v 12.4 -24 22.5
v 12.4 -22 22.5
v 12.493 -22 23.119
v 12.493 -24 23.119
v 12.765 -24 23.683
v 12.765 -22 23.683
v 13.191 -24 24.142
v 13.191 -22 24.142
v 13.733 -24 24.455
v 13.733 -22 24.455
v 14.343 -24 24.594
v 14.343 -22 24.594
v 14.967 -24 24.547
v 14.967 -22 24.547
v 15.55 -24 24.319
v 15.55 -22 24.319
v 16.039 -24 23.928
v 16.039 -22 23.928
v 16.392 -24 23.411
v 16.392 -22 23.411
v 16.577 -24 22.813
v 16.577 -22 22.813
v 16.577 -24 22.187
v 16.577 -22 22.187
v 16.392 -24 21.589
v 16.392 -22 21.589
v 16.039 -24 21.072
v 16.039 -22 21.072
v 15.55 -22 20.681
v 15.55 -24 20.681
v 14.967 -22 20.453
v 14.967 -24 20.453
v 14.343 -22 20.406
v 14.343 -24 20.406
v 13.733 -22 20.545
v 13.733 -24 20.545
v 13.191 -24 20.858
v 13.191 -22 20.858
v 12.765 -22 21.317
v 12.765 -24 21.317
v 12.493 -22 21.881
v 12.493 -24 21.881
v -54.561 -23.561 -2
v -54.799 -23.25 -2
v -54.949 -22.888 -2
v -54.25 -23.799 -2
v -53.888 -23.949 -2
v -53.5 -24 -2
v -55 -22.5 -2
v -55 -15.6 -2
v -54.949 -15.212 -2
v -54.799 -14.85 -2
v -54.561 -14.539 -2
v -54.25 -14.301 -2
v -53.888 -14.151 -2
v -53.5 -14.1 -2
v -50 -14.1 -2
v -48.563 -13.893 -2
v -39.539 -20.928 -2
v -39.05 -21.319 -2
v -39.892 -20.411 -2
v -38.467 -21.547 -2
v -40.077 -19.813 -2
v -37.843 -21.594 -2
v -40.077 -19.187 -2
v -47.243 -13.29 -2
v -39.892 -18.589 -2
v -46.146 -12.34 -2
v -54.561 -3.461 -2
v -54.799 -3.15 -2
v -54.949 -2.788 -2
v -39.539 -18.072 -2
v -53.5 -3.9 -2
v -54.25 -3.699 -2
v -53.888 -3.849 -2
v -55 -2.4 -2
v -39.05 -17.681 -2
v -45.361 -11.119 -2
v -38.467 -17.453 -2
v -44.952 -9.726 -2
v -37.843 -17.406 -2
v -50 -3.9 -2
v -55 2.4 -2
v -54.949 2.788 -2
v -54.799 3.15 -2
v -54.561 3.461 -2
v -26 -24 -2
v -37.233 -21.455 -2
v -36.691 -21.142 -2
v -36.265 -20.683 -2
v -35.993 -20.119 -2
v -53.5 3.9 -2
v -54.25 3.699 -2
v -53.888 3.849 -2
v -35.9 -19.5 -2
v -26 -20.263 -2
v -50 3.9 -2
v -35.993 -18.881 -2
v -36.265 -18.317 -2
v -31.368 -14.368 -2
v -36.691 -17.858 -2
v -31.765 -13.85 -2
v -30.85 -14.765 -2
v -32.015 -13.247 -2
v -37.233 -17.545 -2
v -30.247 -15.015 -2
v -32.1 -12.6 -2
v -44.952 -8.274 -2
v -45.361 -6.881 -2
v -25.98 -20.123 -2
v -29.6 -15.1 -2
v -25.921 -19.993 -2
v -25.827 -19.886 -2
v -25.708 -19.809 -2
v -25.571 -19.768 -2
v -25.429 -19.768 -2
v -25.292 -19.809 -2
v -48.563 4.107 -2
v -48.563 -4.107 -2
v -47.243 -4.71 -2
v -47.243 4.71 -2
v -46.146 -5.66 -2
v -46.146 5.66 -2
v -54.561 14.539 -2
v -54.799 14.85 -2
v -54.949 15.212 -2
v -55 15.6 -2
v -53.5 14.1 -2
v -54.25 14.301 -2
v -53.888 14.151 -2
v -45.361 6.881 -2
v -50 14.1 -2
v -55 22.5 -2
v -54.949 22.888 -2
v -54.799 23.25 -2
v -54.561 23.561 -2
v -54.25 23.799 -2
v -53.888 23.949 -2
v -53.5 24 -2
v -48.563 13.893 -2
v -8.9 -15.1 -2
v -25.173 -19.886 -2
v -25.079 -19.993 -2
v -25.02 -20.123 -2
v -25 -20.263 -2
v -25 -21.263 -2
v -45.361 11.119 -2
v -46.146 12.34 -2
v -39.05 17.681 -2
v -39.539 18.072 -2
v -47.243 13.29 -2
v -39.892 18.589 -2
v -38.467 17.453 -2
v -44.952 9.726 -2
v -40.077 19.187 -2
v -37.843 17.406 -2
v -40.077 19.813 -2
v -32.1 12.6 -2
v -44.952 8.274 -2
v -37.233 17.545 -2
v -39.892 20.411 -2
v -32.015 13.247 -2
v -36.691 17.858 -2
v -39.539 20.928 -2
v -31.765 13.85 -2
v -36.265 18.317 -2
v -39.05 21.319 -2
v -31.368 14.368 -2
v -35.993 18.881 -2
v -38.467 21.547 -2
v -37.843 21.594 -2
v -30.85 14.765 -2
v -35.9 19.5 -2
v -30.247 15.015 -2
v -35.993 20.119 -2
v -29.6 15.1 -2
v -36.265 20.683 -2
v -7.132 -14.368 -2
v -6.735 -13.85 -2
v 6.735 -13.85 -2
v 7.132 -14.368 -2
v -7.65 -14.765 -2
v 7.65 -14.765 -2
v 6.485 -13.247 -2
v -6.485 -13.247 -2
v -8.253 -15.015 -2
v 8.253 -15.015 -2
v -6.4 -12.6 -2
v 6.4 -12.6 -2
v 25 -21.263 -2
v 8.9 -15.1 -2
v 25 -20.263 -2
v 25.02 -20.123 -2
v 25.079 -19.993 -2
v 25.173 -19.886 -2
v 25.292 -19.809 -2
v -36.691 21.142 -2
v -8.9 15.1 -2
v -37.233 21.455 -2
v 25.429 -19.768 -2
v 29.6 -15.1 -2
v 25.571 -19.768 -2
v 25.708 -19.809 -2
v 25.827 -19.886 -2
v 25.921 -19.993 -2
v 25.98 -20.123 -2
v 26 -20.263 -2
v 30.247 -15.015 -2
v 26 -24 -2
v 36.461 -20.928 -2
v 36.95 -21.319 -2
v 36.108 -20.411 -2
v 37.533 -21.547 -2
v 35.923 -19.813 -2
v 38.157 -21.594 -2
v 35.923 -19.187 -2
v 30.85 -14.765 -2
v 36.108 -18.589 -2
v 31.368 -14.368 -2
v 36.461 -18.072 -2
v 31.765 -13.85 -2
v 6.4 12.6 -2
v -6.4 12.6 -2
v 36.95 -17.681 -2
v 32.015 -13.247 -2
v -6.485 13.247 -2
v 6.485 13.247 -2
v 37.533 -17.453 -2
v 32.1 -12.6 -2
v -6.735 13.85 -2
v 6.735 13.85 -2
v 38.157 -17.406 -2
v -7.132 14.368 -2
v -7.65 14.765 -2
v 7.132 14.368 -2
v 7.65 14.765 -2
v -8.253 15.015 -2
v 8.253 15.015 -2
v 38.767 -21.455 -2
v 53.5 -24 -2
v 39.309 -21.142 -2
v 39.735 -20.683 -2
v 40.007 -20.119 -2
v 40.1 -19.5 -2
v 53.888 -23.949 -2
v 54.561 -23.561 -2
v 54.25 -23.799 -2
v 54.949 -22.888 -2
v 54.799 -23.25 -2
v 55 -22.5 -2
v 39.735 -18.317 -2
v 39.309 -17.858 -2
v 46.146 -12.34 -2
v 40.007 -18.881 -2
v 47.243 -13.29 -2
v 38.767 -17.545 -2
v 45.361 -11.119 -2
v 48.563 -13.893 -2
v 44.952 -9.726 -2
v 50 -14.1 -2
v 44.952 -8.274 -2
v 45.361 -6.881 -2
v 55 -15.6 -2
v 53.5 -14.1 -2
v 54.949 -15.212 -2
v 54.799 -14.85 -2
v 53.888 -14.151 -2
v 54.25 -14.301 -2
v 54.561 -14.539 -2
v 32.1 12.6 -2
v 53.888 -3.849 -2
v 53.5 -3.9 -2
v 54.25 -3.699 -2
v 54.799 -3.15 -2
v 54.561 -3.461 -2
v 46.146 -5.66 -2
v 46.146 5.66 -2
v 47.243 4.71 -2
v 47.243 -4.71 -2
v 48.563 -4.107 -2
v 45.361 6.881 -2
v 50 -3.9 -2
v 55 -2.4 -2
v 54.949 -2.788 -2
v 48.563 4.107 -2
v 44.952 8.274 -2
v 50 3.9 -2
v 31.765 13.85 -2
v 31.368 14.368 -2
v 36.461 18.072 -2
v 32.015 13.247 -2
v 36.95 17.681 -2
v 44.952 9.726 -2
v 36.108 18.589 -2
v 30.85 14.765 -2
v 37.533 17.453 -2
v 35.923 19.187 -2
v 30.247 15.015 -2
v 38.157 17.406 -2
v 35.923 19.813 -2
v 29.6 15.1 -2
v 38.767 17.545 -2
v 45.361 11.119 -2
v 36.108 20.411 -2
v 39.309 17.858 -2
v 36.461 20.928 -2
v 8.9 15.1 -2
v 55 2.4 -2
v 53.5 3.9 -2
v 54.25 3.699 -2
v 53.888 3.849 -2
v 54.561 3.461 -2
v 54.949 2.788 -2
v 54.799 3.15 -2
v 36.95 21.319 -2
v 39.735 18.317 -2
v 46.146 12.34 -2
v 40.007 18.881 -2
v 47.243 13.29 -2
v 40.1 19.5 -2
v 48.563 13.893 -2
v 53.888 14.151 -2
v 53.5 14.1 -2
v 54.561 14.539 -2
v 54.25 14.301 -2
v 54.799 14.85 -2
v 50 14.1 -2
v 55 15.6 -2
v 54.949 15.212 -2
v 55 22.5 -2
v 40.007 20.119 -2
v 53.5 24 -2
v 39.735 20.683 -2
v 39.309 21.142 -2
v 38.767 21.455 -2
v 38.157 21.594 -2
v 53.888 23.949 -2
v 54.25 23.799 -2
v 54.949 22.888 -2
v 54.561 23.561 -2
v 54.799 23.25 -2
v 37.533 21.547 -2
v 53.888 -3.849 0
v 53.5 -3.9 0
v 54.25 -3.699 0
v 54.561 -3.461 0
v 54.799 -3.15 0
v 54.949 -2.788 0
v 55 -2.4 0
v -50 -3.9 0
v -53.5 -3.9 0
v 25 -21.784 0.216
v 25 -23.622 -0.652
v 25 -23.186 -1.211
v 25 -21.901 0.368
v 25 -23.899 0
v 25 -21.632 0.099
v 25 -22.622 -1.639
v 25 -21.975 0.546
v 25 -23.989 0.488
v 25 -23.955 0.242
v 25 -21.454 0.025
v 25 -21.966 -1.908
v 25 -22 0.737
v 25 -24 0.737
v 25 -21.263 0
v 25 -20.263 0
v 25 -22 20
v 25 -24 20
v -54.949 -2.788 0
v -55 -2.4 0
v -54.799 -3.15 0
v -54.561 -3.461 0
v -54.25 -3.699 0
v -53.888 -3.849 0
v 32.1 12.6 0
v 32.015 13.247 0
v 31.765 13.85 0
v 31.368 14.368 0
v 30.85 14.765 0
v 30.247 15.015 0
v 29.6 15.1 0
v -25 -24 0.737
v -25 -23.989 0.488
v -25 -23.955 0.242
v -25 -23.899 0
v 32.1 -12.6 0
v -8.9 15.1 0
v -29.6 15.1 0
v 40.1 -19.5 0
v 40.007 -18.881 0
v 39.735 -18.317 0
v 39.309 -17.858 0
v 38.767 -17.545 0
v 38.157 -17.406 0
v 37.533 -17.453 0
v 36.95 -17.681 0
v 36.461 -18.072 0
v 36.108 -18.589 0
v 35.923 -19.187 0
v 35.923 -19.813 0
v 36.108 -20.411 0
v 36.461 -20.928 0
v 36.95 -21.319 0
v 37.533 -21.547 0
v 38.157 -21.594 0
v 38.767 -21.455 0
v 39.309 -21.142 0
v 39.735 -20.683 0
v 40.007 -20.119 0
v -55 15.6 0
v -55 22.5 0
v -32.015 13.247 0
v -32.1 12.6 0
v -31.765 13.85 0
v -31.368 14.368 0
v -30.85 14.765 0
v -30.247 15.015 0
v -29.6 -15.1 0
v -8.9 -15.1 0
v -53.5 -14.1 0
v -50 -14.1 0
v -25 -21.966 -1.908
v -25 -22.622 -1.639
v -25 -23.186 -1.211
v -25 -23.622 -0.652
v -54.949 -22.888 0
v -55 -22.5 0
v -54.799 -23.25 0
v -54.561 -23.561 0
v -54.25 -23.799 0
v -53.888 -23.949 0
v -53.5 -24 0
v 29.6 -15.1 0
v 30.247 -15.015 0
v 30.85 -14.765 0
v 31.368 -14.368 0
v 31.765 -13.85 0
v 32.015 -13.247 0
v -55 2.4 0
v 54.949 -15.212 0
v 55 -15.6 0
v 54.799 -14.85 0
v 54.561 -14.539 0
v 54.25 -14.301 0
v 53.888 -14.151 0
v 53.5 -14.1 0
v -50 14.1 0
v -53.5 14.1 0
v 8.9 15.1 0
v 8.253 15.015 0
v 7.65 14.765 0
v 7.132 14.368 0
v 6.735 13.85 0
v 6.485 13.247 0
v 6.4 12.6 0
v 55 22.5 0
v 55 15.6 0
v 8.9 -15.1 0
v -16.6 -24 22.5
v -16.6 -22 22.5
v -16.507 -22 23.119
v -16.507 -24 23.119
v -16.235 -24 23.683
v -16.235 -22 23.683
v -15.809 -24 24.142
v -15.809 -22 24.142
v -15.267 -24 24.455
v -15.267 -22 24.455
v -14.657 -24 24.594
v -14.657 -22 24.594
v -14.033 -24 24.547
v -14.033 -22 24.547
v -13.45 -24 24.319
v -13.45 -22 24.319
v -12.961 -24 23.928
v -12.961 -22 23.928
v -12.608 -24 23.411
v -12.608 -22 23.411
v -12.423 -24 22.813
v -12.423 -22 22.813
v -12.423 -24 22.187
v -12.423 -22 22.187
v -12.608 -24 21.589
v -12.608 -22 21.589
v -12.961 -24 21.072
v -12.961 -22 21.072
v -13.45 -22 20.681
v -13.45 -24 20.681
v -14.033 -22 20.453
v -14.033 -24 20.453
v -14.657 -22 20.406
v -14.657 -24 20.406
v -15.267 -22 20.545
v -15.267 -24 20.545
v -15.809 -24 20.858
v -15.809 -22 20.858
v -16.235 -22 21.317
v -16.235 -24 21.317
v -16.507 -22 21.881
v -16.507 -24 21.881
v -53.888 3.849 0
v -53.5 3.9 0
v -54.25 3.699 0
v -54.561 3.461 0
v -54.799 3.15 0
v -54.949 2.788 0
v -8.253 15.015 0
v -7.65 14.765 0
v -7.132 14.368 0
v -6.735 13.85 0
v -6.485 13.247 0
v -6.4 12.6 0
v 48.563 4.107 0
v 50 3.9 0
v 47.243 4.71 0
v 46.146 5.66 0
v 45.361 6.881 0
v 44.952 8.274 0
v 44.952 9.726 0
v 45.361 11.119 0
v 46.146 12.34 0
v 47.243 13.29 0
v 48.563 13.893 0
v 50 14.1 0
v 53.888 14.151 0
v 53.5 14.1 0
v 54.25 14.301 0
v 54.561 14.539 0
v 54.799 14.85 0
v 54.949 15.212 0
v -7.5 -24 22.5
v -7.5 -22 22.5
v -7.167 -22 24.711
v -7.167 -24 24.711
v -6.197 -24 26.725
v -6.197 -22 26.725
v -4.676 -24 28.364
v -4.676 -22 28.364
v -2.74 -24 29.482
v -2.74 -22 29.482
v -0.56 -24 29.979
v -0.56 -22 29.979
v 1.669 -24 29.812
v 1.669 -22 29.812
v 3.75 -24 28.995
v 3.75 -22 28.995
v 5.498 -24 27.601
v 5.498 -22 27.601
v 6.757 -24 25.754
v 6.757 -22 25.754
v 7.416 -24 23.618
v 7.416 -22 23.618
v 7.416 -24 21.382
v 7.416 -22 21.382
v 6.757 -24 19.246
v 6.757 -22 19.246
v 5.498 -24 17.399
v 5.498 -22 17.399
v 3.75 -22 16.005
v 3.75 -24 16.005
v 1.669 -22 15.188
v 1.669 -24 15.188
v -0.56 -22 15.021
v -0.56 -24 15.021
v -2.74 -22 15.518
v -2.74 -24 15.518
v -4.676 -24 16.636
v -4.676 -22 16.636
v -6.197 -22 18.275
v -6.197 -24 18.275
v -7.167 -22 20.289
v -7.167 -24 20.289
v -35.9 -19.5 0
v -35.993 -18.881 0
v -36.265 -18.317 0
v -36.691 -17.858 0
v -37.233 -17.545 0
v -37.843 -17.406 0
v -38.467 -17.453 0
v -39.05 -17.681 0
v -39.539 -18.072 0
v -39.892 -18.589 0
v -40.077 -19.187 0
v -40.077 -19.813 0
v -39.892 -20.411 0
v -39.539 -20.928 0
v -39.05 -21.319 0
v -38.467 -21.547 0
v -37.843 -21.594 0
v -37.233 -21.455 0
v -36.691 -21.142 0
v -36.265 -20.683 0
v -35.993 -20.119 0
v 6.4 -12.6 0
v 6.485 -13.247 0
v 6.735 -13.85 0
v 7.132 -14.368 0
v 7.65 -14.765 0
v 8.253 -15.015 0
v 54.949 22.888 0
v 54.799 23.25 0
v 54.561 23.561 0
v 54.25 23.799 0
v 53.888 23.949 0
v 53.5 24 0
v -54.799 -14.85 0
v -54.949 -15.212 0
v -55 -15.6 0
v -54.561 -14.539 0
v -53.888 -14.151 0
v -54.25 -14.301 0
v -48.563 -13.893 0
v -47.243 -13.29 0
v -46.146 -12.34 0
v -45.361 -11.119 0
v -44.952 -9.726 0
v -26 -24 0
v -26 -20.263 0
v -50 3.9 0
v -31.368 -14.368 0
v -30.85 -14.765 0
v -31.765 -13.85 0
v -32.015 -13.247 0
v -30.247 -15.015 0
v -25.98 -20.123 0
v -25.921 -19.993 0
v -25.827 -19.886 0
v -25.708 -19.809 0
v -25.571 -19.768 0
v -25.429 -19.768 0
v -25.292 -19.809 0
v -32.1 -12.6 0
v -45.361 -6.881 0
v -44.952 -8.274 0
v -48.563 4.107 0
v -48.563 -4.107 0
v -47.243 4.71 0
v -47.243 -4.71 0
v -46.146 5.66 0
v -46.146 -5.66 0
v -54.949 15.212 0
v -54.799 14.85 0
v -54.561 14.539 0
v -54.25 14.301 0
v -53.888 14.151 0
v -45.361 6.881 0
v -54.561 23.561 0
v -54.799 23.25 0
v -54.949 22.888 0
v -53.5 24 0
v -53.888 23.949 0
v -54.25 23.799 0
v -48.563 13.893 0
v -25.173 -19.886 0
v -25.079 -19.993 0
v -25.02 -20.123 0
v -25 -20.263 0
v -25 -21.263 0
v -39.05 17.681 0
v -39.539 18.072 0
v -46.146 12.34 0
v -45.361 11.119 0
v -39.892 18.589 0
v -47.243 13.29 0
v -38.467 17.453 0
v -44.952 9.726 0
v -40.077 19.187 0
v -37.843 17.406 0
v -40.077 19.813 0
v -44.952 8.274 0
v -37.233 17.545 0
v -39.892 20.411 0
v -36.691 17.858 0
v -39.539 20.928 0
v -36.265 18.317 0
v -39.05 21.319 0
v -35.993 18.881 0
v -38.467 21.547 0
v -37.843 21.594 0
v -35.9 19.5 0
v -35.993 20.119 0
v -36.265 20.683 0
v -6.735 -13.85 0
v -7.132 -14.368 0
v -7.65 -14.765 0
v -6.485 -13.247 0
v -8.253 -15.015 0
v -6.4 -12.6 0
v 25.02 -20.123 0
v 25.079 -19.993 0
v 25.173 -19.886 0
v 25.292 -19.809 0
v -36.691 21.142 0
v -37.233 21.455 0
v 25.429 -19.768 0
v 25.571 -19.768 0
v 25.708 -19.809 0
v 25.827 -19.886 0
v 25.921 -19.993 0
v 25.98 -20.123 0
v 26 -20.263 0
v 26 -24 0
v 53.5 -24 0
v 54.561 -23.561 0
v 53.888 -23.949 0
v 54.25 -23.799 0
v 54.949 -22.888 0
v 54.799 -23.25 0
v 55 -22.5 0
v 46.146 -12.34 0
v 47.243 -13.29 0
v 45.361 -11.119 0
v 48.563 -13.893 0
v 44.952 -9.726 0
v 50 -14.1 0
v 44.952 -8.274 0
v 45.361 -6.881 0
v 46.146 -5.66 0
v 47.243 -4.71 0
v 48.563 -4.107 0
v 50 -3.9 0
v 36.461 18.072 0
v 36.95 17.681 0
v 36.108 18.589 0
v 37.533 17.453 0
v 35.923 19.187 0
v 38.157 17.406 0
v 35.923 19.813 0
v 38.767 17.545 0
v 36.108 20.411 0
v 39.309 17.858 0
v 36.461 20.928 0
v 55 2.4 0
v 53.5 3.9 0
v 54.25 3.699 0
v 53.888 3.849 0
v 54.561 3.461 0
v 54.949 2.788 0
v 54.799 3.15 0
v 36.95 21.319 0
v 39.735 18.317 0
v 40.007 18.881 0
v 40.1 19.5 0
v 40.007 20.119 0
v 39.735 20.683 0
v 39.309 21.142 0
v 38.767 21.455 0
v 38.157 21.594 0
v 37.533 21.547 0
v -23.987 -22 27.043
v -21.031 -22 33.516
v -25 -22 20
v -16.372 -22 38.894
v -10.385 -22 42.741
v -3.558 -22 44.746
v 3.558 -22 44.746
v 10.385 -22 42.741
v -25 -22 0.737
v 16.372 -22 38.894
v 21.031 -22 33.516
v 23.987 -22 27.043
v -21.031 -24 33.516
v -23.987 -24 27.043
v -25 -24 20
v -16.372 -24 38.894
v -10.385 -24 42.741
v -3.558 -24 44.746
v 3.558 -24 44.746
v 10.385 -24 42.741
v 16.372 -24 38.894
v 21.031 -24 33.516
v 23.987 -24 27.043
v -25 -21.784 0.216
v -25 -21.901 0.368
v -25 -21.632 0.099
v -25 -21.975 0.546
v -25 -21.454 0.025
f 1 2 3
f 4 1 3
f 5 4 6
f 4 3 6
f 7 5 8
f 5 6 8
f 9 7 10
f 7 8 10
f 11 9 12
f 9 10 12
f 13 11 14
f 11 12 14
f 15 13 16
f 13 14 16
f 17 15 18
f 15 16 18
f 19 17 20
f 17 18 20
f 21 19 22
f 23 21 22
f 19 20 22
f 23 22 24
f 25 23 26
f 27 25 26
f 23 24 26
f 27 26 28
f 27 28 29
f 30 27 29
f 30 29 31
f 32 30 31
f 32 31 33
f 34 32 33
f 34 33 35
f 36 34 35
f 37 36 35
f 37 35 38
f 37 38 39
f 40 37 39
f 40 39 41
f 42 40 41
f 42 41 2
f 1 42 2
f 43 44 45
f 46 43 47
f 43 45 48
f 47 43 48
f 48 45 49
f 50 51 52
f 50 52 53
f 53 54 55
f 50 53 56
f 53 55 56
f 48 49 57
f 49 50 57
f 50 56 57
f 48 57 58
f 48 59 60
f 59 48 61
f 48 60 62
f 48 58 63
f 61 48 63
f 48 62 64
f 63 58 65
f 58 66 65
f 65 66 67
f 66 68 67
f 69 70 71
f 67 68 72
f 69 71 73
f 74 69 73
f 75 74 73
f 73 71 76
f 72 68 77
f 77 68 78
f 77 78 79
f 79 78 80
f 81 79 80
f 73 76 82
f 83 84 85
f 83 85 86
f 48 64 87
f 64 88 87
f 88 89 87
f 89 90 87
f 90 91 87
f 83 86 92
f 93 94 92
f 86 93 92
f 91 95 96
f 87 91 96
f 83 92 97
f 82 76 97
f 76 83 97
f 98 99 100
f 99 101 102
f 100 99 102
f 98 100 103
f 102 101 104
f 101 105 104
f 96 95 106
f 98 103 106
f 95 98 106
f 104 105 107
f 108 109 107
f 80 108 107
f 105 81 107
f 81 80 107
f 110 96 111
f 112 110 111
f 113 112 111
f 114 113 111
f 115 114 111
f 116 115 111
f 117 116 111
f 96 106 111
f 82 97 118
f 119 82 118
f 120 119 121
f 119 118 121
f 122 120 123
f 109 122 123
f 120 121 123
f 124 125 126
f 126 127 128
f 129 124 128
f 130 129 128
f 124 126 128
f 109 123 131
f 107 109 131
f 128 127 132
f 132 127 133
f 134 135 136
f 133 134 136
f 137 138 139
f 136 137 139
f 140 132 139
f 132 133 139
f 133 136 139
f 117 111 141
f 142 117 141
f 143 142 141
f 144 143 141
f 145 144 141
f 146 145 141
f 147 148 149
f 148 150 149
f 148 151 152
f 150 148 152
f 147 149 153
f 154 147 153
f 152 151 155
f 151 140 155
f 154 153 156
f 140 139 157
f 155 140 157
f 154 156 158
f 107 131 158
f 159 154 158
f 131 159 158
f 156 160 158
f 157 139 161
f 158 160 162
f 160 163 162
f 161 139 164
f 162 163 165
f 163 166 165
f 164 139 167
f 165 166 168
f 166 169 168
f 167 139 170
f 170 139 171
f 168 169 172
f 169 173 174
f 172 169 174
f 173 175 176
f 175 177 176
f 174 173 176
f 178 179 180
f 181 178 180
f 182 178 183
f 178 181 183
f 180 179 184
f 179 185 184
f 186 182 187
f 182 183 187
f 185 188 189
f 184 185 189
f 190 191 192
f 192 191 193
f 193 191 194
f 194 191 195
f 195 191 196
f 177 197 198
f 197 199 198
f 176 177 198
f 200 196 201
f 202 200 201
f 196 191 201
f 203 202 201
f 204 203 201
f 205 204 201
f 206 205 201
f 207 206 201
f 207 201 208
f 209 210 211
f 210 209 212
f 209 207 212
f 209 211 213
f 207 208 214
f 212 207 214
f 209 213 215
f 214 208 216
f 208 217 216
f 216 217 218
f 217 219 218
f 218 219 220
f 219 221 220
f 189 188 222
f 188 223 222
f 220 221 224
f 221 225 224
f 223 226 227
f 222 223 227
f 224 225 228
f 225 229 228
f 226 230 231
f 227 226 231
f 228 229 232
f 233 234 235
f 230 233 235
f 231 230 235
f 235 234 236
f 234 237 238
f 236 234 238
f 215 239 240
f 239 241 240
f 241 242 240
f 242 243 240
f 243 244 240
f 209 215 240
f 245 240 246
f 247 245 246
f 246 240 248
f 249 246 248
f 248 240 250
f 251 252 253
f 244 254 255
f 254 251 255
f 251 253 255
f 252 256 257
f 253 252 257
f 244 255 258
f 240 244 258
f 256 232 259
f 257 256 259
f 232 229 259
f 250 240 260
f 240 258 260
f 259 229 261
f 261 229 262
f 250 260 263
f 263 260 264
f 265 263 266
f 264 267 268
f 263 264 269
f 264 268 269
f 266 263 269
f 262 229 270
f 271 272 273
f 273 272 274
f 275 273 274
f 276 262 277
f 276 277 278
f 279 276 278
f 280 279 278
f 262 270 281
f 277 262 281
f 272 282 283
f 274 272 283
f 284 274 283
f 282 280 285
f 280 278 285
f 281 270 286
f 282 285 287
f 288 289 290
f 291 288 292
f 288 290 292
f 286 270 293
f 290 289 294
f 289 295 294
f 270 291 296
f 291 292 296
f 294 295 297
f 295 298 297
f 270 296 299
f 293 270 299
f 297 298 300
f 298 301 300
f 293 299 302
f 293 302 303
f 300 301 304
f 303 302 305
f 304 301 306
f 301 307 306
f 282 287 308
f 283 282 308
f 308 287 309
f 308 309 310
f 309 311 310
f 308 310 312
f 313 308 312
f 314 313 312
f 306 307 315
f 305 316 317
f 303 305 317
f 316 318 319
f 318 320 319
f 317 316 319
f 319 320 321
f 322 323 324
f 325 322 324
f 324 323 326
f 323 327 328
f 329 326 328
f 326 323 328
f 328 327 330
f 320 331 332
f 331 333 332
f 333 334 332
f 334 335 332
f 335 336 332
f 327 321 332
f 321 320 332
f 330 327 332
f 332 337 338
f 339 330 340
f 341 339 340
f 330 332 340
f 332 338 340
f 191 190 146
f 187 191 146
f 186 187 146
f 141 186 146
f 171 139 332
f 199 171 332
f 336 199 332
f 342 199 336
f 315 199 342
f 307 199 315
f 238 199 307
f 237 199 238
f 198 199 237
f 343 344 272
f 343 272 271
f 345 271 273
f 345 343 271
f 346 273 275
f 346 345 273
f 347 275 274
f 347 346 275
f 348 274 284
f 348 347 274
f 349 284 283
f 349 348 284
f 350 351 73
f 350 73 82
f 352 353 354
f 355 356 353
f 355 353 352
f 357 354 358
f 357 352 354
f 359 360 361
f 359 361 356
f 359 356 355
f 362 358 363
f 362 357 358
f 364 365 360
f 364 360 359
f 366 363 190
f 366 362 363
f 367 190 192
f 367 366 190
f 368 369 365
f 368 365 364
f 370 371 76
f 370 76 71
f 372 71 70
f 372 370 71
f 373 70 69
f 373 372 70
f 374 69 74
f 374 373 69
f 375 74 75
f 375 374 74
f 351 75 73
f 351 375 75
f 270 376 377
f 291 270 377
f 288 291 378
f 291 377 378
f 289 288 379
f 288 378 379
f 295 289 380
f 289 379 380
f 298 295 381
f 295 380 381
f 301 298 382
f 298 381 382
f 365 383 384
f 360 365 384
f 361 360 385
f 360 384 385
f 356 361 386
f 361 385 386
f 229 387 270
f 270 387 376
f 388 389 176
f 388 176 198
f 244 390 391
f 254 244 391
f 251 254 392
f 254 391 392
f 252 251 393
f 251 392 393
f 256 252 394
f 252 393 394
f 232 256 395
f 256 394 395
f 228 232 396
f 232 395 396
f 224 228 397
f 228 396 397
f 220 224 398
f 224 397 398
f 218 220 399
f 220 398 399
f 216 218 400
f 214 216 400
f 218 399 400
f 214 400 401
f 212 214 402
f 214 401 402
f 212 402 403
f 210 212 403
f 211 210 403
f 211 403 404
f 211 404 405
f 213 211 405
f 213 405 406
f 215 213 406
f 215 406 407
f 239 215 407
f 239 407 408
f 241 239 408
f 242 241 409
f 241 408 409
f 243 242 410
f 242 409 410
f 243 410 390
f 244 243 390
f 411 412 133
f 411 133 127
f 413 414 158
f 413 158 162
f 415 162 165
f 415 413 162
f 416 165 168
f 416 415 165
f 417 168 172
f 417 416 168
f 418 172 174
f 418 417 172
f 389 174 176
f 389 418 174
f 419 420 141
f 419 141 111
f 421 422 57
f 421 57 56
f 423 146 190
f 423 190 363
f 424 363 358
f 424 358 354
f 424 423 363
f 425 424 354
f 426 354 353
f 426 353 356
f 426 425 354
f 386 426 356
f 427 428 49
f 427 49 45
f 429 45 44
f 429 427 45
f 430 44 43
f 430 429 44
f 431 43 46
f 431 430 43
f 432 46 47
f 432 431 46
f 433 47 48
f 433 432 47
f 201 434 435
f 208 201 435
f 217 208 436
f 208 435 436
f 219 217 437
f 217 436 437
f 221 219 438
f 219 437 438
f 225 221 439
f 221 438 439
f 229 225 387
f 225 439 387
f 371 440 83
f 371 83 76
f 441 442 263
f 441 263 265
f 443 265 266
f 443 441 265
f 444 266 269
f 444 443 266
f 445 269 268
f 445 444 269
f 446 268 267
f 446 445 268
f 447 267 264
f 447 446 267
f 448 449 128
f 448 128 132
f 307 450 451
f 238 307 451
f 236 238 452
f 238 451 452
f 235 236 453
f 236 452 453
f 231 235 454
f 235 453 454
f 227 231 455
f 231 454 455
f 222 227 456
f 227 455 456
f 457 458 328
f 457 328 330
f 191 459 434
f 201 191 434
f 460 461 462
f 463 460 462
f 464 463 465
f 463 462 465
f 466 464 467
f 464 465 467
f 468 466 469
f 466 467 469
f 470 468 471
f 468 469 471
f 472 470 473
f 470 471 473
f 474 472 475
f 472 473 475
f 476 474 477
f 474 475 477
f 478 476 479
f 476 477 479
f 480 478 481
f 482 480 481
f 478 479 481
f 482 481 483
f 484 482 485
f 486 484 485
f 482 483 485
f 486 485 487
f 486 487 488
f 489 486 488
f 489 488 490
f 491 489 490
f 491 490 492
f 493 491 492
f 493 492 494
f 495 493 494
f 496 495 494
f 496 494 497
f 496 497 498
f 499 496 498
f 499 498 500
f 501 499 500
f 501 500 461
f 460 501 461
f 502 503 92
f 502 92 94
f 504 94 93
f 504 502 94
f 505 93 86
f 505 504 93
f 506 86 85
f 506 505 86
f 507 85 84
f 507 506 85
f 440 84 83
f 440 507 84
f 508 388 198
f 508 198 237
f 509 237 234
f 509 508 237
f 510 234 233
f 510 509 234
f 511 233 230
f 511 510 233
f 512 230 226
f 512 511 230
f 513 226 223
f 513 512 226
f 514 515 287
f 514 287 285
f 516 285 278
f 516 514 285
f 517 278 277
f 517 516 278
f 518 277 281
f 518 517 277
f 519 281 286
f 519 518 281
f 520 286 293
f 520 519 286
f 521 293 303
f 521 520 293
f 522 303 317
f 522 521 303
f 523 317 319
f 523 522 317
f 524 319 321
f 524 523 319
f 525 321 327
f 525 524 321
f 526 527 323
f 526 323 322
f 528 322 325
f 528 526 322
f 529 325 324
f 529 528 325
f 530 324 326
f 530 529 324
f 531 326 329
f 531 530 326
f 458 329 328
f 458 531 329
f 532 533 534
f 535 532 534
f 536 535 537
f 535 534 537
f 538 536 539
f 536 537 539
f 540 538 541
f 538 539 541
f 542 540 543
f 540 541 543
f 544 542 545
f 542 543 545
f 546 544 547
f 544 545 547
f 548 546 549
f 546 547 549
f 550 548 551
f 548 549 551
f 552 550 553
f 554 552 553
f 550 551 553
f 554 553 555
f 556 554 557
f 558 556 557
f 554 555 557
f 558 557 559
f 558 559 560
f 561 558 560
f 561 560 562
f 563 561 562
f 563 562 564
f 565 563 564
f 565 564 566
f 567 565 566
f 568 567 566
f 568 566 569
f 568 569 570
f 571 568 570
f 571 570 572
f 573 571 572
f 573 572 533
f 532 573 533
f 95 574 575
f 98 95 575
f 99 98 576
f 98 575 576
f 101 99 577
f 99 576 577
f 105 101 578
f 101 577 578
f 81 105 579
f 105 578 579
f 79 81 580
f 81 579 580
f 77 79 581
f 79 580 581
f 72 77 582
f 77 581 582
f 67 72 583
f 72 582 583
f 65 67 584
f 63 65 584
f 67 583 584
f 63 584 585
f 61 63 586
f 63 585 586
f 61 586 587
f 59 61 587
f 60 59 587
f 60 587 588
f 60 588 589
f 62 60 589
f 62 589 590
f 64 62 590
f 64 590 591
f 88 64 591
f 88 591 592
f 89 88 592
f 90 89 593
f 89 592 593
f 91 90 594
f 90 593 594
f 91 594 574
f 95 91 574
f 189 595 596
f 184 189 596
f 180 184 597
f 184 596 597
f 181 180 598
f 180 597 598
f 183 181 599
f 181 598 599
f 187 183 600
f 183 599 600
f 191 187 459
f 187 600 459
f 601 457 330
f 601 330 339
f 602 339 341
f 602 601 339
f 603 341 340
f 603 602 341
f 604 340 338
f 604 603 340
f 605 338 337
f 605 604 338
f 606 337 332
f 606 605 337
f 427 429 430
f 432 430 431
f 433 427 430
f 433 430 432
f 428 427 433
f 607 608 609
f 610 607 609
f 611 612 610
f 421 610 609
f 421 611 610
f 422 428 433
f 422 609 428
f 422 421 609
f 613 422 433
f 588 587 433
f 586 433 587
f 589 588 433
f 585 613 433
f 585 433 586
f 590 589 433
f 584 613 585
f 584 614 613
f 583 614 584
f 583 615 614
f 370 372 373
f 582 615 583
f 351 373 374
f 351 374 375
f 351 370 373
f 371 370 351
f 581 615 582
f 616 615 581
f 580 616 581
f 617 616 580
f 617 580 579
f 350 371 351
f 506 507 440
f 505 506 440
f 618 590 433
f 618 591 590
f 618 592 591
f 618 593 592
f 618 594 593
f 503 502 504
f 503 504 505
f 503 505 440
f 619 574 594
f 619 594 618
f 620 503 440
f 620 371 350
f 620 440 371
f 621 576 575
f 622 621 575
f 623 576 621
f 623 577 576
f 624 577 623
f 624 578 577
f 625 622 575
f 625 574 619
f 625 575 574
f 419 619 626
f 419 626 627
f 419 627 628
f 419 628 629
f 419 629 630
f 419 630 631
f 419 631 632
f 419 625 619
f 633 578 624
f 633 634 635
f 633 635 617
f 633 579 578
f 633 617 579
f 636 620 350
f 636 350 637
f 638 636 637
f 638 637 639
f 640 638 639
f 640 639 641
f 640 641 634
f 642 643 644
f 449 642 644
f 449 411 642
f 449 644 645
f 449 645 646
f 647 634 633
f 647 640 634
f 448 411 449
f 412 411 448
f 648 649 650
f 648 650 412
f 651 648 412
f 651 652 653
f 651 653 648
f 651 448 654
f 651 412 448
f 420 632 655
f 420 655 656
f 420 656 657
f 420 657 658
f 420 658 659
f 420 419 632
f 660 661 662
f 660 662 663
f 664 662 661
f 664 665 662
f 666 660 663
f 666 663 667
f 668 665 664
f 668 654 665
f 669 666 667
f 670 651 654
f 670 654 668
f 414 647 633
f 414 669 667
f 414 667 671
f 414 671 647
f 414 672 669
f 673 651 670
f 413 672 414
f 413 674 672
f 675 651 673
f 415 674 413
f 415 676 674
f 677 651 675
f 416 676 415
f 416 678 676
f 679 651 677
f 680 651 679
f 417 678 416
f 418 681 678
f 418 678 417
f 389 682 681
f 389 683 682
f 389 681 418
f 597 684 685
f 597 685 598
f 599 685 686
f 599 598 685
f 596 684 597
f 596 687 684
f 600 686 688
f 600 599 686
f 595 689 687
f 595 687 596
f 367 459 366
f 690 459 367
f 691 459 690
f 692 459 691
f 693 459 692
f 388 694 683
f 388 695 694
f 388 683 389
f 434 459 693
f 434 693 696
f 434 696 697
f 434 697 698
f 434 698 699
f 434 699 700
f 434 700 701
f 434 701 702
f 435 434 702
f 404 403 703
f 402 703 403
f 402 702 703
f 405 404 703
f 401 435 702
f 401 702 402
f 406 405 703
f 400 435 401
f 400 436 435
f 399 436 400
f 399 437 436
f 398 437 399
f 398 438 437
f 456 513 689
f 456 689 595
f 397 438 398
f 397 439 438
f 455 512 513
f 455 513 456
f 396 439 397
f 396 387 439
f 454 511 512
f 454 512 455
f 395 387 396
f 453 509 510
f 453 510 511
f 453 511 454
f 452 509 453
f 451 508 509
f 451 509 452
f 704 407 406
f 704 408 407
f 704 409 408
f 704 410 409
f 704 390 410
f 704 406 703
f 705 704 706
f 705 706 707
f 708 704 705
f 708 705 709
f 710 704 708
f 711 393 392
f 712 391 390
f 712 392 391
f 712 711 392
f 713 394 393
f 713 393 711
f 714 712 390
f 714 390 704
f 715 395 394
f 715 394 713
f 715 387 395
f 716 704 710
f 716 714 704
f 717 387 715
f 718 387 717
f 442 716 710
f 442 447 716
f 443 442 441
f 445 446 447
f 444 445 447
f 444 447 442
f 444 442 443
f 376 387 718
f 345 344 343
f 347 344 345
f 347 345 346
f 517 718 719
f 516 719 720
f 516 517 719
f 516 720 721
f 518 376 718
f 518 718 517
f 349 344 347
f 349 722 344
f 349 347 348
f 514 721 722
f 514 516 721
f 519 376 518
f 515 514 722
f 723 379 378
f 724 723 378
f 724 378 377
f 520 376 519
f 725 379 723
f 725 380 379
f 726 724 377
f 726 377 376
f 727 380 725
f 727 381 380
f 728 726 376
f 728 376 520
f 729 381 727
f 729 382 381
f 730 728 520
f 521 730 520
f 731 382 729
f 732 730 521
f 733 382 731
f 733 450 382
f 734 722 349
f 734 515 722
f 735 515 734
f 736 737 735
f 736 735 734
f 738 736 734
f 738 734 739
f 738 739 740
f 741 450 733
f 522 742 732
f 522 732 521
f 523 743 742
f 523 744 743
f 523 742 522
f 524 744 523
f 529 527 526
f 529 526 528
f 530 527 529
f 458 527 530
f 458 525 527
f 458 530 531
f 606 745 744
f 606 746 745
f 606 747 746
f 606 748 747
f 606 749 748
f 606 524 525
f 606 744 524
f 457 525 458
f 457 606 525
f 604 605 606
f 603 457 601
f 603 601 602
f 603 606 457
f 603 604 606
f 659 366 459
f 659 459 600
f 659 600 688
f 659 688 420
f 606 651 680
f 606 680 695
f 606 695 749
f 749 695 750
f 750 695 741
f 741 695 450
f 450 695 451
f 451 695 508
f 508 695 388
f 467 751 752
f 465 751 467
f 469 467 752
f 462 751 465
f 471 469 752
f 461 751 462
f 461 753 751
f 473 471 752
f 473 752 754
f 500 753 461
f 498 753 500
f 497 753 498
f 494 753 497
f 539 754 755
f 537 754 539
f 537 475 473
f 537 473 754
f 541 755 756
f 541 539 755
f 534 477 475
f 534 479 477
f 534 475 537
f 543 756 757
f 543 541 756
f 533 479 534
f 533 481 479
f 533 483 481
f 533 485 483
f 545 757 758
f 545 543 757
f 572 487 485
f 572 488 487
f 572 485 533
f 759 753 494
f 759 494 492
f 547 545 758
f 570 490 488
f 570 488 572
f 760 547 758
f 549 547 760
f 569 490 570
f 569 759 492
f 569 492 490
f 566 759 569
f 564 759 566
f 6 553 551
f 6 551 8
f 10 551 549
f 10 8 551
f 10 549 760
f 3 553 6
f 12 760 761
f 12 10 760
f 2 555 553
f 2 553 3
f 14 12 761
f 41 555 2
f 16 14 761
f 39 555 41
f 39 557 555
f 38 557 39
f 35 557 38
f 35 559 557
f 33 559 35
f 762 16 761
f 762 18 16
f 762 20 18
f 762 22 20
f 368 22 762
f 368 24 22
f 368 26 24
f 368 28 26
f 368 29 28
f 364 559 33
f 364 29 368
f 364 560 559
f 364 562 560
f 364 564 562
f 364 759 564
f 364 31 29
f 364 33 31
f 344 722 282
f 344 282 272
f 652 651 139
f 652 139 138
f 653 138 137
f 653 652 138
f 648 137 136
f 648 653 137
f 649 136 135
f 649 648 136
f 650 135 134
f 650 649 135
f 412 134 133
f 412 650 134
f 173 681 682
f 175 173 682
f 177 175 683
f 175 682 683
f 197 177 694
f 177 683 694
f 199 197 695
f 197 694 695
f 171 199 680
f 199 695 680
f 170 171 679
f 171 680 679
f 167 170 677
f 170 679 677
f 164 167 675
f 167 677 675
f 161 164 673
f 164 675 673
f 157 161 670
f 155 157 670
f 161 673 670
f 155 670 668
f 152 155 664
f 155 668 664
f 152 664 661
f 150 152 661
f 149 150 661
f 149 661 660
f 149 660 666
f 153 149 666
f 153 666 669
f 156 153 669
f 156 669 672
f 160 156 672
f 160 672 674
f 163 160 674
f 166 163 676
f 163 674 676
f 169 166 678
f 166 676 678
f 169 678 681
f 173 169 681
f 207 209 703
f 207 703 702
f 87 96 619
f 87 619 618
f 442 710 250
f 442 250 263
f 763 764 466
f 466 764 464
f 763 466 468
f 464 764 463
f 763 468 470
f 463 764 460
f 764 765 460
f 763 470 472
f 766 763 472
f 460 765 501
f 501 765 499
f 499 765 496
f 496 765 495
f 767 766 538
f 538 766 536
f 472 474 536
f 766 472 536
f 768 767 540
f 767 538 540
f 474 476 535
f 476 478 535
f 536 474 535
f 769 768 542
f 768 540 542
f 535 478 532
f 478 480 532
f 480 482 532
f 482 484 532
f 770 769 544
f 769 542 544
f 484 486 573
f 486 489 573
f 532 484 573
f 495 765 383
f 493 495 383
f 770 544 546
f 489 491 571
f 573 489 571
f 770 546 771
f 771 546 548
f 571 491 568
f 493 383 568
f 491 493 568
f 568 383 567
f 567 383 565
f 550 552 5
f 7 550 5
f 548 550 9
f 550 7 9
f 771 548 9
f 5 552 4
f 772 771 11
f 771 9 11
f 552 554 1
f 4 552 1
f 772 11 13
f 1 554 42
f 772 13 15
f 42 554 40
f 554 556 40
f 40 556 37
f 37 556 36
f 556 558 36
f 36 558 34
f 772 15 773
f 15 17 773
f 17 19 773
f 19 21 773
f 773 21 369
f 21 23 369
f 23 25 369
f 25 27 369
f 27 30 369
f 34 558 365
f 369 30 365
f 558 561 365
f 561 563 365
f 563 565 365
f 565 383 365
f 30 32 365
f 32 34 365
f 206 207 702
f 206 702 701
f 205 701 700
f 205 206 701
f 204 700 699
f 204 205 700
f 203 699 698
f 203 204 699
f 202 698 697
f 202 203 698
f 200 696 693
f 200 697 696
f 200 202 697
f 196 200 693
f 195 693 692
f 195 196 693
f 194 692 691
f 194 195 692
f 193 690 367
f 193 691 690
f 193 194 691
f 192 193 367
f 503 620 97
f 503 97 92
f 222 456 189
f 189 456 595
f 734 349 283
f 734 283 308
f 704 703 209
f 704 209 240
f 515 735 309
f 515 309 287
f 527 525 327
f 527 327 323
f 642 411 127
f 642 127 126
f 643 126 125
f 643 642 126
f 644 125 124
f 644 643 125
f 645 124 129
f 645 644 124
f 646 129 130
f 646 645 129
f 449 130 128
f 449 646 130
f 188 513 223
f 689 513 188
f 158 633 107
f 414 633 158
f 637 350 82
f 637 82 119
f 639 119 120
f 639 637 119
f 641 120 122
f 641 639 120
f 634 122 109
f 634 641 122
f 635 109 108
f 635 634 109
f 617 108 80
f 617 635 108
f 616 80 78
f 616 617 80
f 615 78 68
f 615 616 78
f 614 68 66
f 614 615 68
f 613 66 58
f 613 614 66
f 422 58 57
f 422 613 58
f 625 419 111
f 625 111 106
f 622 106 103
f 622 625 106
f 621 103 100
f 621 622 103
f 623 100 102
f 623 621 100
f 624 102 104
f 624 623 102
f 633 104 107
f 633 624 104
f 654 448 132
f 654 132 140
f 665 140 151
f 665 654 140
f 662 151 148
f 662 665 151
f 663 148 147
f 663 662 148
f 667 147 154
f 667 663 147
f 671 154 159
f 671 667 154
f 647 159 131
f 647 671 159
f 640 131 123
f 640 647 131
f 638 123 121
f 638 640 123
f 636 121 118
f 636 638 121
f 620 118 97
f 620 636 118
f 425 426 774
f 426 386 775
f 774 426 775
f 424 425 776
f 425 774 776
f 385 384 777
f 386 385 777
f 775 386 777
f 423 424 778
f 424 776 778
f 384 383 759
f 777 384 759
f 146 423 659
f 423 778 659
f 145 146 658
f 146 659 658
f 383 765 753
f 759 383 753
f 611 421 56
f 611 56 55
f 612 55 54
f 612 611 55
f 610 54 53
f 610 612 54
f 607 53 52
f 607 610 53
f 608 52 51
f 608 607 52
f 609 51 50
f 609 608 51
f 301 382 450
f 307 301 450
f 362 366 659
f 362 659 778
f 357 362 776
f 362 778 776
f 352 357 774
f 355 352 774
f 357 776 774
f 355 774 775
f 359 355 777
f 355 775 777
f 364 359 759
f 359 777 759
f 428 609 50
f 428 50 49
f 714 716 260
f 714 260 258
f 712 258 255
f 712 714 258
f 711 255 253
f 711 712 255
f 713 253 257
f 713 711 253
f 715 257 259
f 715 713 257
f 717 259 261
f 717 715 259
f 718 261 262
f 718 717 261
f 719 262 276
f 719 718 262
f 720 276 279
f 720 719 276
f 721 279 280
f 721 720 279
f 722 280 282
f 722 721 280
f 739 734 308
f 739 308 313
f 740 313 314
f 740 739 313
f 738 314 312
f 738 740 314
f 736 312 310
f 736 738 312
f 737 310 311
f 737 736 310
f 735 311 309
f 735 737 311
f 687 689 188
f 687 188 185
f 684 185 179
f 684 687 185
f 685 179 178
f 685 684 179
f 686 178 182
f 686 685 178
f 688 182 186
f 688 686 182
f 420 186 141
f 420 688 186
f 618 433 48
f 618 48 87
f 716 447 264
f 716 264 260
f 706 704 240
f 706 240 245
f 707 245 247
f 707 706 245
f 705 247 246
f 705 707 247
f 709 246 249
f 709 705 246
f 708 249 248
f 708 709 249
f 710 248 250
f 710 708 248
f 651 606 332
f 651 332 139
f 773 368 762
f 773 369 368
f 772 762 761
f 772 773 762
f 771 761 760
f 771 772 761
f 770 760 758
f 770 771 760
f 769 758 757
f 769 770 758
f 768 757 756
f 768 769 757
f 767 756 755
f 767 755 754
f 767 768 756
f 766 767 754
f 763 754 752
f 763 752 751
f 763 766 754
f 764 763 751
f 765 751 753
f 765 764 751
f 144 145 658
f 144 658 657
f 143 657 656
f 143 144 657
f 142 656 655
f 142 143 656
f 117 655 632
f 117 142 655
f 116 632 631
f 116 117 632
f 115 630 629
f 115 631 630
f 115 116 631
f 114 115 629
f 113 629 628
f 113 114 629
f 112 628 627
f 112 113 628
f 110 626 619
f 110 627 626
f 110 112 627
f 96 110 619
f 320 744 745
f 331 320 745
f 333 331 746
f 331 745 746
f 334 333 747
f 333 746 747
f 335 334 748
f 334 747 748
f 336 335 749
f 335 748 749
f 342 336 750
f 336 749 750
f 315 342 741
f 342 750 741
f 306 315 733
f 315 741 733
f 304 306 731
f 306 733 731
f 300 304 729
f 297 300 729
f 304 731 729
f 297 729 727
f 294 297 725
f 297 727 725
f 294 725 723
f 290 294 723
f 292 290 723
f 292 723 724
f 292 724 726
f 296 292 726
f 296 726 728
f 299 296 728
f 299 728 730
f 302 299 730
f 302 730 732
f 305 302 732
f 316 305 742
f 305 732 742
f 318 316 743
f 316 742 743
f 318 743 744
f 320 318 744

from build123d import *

# Parameters (mm, degrees)
SKETCH1_R                = 2.1
BASE_FLANGE1_DEPTH       = 2
EDGE_FLANGE1_START       = -3
EDGE_FLANGE1_DEPTH       = 3.7366
EDGE_FLANGE1_START_2     = 0.7366
EDGE_FLANGE1_2_OUTLINE_W = 50
EDGE_FLANGE1_2_OUTLINE_H = 2
EDGE_FLANGE1_2_DEPTH     = 44.2634
EDGE_FLANGE1_START_3     = -25
EDGE_FLANGE1_3_DEPTH     = 50
EDGE_FLANGE1_4_DEPTH     = 50
FILLET1_RADIUS           = 25
FILLET1_LENGTH           = 2
CUT_EXTRUDE1_REACH       = 86.652
SKETCH9_R                = 7.5
SKETCH9_R_2              = 2.1


with BuildPart() as part:
    # Base-Flange1: sheet metal written as solids
    # Sketch1 → Base-Flange1 (new body)
    with BuildSketch(Plane.XY):
        with BuildLine():
            Line((-53.5, -24), (53.5, -24))
            ThreePointArc((53.5, -24), (54.560660172, -23.560660172), (55, -22.5))
            Line((55, -22.5), (55, -15.6))
            ThreePointArc((55, -15.6), (54.560660172, -14.539339828), (53.5, -14.1))
            Line((53.5, -14.1), (50, -14.1))
            ThreePointArc((50, -14.1), (44.9, -9), (50, -3.9))
            Line((50, -3.9), (53.5, -3.9))
            ThreePointArc((53.5, -3.9), (54.560660172, -3.460660172), (55, -2.4))
            Line((55, -2.4), (55, 2.4))
            ThreePointArc((55, 2.4), (54.560660172, 3.460660172), (53.5, 3.9))
            Line((53.5, 3.9), (50, 3.9))
            ThreePointArc((50, 3.9), (44.9, 9), (50, 14.1))
            Line((50, 14.1), (53.5, 14.1))
            ThreePointArc((53.5, 14.1), (54.560660172, 14.539339828), (55, 15.6))
            Line((55, 15.6), (55, 22.5))
            ThreePointArc((55, 22.5), (54.560660172, 23.560660172), (53.5, 24))
            Line((53.5, 24), (-53.5, 24))
            ThreePointArc((-53.5, 24), (-54.560660172, 23.560660172), (-55, 22.5))
            Line((-55, 22.5), (-55, 15.6))
            ThreePointArc((-55, 15.6), (-54.560660172, 14.539339828), (-53.5, 14.1))
            Line((-53.5, 14.1), (-50, 14.1))
            ThreePointArc((-50, 14.1), (-44.9, 9), (-50, 3.9))
            Line((-50, 3.9), (-53.5, 3.9))
            ThreePointArc((-53.5, 3.9), (-54.560660172, 3.460660172), (-55, 2.4))
            Line((-55, 2.4), (-55, -2.4))
            ThreePointArc((-55, -2.4), (-54.560660172, -3.460660172), (-53.5, -3.9))
            Line((-53.5, -3.9), (-50, -3.9))
            ThreePointArc((-50, -3.9), (-44.9, -9), (-50, -14.1))
            Line((-50, -14.1), (-53.5, -14.1))
            ThreePointArc((-53.5, -14.1), (-54.560660172, -14.539339828), (-55, -15.6))
            Line((-55, -15.6), (-55, -22.5))
            ThreePointArc((-55, -22.5), (-54.560660172, -23.560660172), (-53.5, -24))
        make_face()
        with Locations((-38, 19.5)):
            Circle(SKETCH1_R, mode=Mode.SUBTRACT)
        with Locations((-38, -19.5)):
            Circle(SKETCH1_R, mode=Mode.SUBTRACT)
        with Locations((38, 19.5)):
            Circle(SKETCH1_R, mode=Mode.SUBTRACT)
        with Locations((38, -19.5)):
            Circle(SKETCH1_R, mode=Mode.SUBTRACT)
        with BuildLine():
            Line((6.4, 12.6), (6.4, -12.6))
            ThreePointArc((6.4, -12.6), (7.132233047, -14.367766953), (8.9, -15.1))
            Line((8.9, -15.1), (29.6, -15.1))
            ThreePointArc((29.6, -15.1), (31.367766953, -14.367766953), (32.1, -12.6))
            Line((32.1, -12.6), (32.1, 12.6))
            ThreePointArc((32.1, 12.6), (31.367766953, 14.367766953), (29.6, 15.1))
            Line((29.6, 15.1), (8.9, 15.1))
            ThreePointArc((8.9, 15.1), (7.132233047, 14.367766953), (6.4, 12.6))
        make_face(mode=Mode.SUBTRACT)
        with BuildLine():
            Line((-6.4, 12.6), (-6.4, -12.6))
            ThreePointArc((-6.4, -12.6), (-7.132233047, -14.367766953), (-8.9, -15.1))
            Line((-8.9, -15.1), (-29.6, -15.1))
            ThreePointArc((-29.6, -15.1), (-31.367766953, -14.367766953), (-32.1, -12.6))
            Line((-32.1, -12.6), (-32.1, 12.6))
            ThreePointArc((-32.1, 12.6), (-31.367766953, 14.367766953), (-29.6, 15.1))
            Line((-29.6, 15.1), (-8.9, 15.1))
            ThreePointArc((-8.9, 15.1), (-7.132233047, 14.367766953), (-6.4, 12.6))
        make_face(mode=Mode.SUBTRACT)
    extrude(amount=-BASE_FLANGE1_DEPTH)

    # Edge-Flange1: read off the stored shape, not the designer's step
    # Edge-Flange1 outline → Edge-Flange1 (cut)
    with BuildSketch(Plane.XY.offset(EDGE_FLANGE1_START)):
        with BuildLine():
            Line((-26, -24), (-25, -24))
            Line((-25, -24), (-25, -20.2634))
            ThreePointArc((-25, -20.2634), (-25.5, -19.7634), (-26, -20.2634))
            Line((-26, -20.2634), (-26, -24))
        make_face()
        with BuildLine():
            Line((25, -20.2634), (25, -24))
            Line((25, -24), (26, -24))
            Line((26, -24), (26, -20.2634))
            ThreePointArc((26, -20.2634), (25.5, -19.7634), (25, -20.2634))
        make_face()
    extrude(amount=EDGE_FLANGE1_DEPTH, mode=Mode.SUBTRACT)

    # Edge-Flange1 3 outline → Edge-Flange1 3 (cut)
    with BuildSketch(Plane.YZ.offset(EDGE_FLANGE1_START_3)):
        with BuildLine():
            ThreePointArc((-21.2634, -2), (-22.917667209, -1.443395312), (-23.899002398, 0))
            Line((-23.899002398, 0), (-24, 0))
            Line((-24, 0), (-24, -2))
            Line((-24, -2), (-21.2634, -2))
        make_face()
    extrude(amount=EDGE_FLANGE1_3_DEPTH, mode=Mode.SUBTRACT)



with BuildPart() as body_2:
    # Edge-Flange1 2 outline → Edge-Flange1 2 (new body)
    with BuildSketch(Plane.XY.offset(EDGE_FLANGE1_START_2)):
        with Locations((0, -23)):
            Rectangle(EDGE_FLANGE1_2_OUTLINE_W, EDGE_FLANGE1_2_OUTLINE_H)
    extrude(amount=EDGE_FLANGE1_2_DEPTH)


with BuildPart() as part_1:
    add(part.part)

    add(body_2.part)  # Edge-Flange1 4 merges body 2
    # Edge-Flange1 4 outline → Edge-Flange1 4 (add)
    with BuildSketch(Plane.YZ.offset(EDGE_FLANGE1_START_3)):
        with BuildLine():
            Line((-22, 0.7366), (-24, 0.7366))
            ThreePointArc((-24, 0.7366), (-23.974633029, 0.364854094), (-23.899002398, 0))
            Line((-23.899002398, 0), (-21.2634, 0))
            ThreePointArc((-21.2634, 0), (-21.784254855, 0.215745145), (-22, 0.7366))
        make_face()
    extrude(amount=EDGE_FLANGE1_4_DEPTH)

    # Fillet1: full round fillet: the end face becomes a half cylinder, R = half its width
    fillet1_face = Plane((0, -23, 45), x_dir=(0, -1, 0), z_dir=(0, 0, 1))  # on the end face: x along it, z out of the body
    fillet1_slab = fillet1_face.offset(-FILLET1_RADIUS / 2) * Box(FILLET1_LENGTH, 2 * FILLET1_RADIUS, FILLET1_RADIUS, mode=Mode.PRIVATE)  # the body's end, R deep
    fillet1_round = Plane((0, -23, 20), x_dir=(0, 0, 1), z_dir=(0, -1, 0)) * Cylinder(FILLET1_RADIUS, FILLET1_LENGTH, mode=Mode.PRIVATE)  # its axis R under the face
    add(fillet1_slab - fillet1_round, mode=Mode.SUBTRACT)

    # Sketch9 → Cut-Extrude1 (cut, up to next)
    with BuildSketch(Plane(origin=(0, -22, 0), x_dir=(1, 0, 0), z_dir=(0, 1, 0)), mode=Mode.PRIVATE) as cut_extrude1_sk1:
        with Locations(Location((0, -22.5, 0), (0, 0, 180))):
            Circle(SKETCH9_R)
    cut_extrude1_tool1 = extrude(cut_extrude1_sk1.sketch, amount=-CUT_EXTRUDE1_REACH, mode=Mode.PRIVATE) & part_1.part
    # Sketch9 → Cut-Extrude1 (cut, up to next)
    with BuildSketch(Plane(origin=(0, -22, 0), x_dir=(1, 0, 0), z_dir=(0, 1, 0)), mode=Mode.PRIVATE) as cut_extrude1_sk2:
        with Locations(Location((-14.5, -22.5, 0), (0, 0, 180))):
            Circle(SKETCH9_R_2)
    cut_extrude1_tool2 = extrude(cut_extrude1_sk2.sketch, amount=-CUT_EXTRUDE1_REACH, mode=Mode.PRIVATE) & part_1.part
    # Sketch9 → Cut-Extrude1 (cut, up to next)
    with BuildSketch(Plane(origin=(0, -22, 0), x_dir=(1, 0, 0), z_dir=(0, 1, 0)), mode=Mode.PRIVATE) as cut_extrude1_sk3:
        with Locations(Location((14.5, -22.5, 0), (0, 0, 180))):
            Circle(SKETCH9_R_2)
    cut_extrude1_tool3 = extrude(cut_extrude1_sk3.sketch, amount=-CUT_EXTRUDE1_REACH, mode=Mode.PRIVATE) & part_1.part
    add(cut_extrude1_tool1.solids().sort_by_distance((0, -22, 22.5))[0], mode=Mode.SUBTRACT)
    add(cut_extrude1_tool2.solids().sort_by_distance((-14.5, -22, 22.5))[0], mode=Mode.SUBTRACT)
    add(cut_extrude1_tool3.solids().sort_by_distance((14.5, -22, 22.5))[0], mode=Mode.SUBTRACT)


solid = part_1.part
